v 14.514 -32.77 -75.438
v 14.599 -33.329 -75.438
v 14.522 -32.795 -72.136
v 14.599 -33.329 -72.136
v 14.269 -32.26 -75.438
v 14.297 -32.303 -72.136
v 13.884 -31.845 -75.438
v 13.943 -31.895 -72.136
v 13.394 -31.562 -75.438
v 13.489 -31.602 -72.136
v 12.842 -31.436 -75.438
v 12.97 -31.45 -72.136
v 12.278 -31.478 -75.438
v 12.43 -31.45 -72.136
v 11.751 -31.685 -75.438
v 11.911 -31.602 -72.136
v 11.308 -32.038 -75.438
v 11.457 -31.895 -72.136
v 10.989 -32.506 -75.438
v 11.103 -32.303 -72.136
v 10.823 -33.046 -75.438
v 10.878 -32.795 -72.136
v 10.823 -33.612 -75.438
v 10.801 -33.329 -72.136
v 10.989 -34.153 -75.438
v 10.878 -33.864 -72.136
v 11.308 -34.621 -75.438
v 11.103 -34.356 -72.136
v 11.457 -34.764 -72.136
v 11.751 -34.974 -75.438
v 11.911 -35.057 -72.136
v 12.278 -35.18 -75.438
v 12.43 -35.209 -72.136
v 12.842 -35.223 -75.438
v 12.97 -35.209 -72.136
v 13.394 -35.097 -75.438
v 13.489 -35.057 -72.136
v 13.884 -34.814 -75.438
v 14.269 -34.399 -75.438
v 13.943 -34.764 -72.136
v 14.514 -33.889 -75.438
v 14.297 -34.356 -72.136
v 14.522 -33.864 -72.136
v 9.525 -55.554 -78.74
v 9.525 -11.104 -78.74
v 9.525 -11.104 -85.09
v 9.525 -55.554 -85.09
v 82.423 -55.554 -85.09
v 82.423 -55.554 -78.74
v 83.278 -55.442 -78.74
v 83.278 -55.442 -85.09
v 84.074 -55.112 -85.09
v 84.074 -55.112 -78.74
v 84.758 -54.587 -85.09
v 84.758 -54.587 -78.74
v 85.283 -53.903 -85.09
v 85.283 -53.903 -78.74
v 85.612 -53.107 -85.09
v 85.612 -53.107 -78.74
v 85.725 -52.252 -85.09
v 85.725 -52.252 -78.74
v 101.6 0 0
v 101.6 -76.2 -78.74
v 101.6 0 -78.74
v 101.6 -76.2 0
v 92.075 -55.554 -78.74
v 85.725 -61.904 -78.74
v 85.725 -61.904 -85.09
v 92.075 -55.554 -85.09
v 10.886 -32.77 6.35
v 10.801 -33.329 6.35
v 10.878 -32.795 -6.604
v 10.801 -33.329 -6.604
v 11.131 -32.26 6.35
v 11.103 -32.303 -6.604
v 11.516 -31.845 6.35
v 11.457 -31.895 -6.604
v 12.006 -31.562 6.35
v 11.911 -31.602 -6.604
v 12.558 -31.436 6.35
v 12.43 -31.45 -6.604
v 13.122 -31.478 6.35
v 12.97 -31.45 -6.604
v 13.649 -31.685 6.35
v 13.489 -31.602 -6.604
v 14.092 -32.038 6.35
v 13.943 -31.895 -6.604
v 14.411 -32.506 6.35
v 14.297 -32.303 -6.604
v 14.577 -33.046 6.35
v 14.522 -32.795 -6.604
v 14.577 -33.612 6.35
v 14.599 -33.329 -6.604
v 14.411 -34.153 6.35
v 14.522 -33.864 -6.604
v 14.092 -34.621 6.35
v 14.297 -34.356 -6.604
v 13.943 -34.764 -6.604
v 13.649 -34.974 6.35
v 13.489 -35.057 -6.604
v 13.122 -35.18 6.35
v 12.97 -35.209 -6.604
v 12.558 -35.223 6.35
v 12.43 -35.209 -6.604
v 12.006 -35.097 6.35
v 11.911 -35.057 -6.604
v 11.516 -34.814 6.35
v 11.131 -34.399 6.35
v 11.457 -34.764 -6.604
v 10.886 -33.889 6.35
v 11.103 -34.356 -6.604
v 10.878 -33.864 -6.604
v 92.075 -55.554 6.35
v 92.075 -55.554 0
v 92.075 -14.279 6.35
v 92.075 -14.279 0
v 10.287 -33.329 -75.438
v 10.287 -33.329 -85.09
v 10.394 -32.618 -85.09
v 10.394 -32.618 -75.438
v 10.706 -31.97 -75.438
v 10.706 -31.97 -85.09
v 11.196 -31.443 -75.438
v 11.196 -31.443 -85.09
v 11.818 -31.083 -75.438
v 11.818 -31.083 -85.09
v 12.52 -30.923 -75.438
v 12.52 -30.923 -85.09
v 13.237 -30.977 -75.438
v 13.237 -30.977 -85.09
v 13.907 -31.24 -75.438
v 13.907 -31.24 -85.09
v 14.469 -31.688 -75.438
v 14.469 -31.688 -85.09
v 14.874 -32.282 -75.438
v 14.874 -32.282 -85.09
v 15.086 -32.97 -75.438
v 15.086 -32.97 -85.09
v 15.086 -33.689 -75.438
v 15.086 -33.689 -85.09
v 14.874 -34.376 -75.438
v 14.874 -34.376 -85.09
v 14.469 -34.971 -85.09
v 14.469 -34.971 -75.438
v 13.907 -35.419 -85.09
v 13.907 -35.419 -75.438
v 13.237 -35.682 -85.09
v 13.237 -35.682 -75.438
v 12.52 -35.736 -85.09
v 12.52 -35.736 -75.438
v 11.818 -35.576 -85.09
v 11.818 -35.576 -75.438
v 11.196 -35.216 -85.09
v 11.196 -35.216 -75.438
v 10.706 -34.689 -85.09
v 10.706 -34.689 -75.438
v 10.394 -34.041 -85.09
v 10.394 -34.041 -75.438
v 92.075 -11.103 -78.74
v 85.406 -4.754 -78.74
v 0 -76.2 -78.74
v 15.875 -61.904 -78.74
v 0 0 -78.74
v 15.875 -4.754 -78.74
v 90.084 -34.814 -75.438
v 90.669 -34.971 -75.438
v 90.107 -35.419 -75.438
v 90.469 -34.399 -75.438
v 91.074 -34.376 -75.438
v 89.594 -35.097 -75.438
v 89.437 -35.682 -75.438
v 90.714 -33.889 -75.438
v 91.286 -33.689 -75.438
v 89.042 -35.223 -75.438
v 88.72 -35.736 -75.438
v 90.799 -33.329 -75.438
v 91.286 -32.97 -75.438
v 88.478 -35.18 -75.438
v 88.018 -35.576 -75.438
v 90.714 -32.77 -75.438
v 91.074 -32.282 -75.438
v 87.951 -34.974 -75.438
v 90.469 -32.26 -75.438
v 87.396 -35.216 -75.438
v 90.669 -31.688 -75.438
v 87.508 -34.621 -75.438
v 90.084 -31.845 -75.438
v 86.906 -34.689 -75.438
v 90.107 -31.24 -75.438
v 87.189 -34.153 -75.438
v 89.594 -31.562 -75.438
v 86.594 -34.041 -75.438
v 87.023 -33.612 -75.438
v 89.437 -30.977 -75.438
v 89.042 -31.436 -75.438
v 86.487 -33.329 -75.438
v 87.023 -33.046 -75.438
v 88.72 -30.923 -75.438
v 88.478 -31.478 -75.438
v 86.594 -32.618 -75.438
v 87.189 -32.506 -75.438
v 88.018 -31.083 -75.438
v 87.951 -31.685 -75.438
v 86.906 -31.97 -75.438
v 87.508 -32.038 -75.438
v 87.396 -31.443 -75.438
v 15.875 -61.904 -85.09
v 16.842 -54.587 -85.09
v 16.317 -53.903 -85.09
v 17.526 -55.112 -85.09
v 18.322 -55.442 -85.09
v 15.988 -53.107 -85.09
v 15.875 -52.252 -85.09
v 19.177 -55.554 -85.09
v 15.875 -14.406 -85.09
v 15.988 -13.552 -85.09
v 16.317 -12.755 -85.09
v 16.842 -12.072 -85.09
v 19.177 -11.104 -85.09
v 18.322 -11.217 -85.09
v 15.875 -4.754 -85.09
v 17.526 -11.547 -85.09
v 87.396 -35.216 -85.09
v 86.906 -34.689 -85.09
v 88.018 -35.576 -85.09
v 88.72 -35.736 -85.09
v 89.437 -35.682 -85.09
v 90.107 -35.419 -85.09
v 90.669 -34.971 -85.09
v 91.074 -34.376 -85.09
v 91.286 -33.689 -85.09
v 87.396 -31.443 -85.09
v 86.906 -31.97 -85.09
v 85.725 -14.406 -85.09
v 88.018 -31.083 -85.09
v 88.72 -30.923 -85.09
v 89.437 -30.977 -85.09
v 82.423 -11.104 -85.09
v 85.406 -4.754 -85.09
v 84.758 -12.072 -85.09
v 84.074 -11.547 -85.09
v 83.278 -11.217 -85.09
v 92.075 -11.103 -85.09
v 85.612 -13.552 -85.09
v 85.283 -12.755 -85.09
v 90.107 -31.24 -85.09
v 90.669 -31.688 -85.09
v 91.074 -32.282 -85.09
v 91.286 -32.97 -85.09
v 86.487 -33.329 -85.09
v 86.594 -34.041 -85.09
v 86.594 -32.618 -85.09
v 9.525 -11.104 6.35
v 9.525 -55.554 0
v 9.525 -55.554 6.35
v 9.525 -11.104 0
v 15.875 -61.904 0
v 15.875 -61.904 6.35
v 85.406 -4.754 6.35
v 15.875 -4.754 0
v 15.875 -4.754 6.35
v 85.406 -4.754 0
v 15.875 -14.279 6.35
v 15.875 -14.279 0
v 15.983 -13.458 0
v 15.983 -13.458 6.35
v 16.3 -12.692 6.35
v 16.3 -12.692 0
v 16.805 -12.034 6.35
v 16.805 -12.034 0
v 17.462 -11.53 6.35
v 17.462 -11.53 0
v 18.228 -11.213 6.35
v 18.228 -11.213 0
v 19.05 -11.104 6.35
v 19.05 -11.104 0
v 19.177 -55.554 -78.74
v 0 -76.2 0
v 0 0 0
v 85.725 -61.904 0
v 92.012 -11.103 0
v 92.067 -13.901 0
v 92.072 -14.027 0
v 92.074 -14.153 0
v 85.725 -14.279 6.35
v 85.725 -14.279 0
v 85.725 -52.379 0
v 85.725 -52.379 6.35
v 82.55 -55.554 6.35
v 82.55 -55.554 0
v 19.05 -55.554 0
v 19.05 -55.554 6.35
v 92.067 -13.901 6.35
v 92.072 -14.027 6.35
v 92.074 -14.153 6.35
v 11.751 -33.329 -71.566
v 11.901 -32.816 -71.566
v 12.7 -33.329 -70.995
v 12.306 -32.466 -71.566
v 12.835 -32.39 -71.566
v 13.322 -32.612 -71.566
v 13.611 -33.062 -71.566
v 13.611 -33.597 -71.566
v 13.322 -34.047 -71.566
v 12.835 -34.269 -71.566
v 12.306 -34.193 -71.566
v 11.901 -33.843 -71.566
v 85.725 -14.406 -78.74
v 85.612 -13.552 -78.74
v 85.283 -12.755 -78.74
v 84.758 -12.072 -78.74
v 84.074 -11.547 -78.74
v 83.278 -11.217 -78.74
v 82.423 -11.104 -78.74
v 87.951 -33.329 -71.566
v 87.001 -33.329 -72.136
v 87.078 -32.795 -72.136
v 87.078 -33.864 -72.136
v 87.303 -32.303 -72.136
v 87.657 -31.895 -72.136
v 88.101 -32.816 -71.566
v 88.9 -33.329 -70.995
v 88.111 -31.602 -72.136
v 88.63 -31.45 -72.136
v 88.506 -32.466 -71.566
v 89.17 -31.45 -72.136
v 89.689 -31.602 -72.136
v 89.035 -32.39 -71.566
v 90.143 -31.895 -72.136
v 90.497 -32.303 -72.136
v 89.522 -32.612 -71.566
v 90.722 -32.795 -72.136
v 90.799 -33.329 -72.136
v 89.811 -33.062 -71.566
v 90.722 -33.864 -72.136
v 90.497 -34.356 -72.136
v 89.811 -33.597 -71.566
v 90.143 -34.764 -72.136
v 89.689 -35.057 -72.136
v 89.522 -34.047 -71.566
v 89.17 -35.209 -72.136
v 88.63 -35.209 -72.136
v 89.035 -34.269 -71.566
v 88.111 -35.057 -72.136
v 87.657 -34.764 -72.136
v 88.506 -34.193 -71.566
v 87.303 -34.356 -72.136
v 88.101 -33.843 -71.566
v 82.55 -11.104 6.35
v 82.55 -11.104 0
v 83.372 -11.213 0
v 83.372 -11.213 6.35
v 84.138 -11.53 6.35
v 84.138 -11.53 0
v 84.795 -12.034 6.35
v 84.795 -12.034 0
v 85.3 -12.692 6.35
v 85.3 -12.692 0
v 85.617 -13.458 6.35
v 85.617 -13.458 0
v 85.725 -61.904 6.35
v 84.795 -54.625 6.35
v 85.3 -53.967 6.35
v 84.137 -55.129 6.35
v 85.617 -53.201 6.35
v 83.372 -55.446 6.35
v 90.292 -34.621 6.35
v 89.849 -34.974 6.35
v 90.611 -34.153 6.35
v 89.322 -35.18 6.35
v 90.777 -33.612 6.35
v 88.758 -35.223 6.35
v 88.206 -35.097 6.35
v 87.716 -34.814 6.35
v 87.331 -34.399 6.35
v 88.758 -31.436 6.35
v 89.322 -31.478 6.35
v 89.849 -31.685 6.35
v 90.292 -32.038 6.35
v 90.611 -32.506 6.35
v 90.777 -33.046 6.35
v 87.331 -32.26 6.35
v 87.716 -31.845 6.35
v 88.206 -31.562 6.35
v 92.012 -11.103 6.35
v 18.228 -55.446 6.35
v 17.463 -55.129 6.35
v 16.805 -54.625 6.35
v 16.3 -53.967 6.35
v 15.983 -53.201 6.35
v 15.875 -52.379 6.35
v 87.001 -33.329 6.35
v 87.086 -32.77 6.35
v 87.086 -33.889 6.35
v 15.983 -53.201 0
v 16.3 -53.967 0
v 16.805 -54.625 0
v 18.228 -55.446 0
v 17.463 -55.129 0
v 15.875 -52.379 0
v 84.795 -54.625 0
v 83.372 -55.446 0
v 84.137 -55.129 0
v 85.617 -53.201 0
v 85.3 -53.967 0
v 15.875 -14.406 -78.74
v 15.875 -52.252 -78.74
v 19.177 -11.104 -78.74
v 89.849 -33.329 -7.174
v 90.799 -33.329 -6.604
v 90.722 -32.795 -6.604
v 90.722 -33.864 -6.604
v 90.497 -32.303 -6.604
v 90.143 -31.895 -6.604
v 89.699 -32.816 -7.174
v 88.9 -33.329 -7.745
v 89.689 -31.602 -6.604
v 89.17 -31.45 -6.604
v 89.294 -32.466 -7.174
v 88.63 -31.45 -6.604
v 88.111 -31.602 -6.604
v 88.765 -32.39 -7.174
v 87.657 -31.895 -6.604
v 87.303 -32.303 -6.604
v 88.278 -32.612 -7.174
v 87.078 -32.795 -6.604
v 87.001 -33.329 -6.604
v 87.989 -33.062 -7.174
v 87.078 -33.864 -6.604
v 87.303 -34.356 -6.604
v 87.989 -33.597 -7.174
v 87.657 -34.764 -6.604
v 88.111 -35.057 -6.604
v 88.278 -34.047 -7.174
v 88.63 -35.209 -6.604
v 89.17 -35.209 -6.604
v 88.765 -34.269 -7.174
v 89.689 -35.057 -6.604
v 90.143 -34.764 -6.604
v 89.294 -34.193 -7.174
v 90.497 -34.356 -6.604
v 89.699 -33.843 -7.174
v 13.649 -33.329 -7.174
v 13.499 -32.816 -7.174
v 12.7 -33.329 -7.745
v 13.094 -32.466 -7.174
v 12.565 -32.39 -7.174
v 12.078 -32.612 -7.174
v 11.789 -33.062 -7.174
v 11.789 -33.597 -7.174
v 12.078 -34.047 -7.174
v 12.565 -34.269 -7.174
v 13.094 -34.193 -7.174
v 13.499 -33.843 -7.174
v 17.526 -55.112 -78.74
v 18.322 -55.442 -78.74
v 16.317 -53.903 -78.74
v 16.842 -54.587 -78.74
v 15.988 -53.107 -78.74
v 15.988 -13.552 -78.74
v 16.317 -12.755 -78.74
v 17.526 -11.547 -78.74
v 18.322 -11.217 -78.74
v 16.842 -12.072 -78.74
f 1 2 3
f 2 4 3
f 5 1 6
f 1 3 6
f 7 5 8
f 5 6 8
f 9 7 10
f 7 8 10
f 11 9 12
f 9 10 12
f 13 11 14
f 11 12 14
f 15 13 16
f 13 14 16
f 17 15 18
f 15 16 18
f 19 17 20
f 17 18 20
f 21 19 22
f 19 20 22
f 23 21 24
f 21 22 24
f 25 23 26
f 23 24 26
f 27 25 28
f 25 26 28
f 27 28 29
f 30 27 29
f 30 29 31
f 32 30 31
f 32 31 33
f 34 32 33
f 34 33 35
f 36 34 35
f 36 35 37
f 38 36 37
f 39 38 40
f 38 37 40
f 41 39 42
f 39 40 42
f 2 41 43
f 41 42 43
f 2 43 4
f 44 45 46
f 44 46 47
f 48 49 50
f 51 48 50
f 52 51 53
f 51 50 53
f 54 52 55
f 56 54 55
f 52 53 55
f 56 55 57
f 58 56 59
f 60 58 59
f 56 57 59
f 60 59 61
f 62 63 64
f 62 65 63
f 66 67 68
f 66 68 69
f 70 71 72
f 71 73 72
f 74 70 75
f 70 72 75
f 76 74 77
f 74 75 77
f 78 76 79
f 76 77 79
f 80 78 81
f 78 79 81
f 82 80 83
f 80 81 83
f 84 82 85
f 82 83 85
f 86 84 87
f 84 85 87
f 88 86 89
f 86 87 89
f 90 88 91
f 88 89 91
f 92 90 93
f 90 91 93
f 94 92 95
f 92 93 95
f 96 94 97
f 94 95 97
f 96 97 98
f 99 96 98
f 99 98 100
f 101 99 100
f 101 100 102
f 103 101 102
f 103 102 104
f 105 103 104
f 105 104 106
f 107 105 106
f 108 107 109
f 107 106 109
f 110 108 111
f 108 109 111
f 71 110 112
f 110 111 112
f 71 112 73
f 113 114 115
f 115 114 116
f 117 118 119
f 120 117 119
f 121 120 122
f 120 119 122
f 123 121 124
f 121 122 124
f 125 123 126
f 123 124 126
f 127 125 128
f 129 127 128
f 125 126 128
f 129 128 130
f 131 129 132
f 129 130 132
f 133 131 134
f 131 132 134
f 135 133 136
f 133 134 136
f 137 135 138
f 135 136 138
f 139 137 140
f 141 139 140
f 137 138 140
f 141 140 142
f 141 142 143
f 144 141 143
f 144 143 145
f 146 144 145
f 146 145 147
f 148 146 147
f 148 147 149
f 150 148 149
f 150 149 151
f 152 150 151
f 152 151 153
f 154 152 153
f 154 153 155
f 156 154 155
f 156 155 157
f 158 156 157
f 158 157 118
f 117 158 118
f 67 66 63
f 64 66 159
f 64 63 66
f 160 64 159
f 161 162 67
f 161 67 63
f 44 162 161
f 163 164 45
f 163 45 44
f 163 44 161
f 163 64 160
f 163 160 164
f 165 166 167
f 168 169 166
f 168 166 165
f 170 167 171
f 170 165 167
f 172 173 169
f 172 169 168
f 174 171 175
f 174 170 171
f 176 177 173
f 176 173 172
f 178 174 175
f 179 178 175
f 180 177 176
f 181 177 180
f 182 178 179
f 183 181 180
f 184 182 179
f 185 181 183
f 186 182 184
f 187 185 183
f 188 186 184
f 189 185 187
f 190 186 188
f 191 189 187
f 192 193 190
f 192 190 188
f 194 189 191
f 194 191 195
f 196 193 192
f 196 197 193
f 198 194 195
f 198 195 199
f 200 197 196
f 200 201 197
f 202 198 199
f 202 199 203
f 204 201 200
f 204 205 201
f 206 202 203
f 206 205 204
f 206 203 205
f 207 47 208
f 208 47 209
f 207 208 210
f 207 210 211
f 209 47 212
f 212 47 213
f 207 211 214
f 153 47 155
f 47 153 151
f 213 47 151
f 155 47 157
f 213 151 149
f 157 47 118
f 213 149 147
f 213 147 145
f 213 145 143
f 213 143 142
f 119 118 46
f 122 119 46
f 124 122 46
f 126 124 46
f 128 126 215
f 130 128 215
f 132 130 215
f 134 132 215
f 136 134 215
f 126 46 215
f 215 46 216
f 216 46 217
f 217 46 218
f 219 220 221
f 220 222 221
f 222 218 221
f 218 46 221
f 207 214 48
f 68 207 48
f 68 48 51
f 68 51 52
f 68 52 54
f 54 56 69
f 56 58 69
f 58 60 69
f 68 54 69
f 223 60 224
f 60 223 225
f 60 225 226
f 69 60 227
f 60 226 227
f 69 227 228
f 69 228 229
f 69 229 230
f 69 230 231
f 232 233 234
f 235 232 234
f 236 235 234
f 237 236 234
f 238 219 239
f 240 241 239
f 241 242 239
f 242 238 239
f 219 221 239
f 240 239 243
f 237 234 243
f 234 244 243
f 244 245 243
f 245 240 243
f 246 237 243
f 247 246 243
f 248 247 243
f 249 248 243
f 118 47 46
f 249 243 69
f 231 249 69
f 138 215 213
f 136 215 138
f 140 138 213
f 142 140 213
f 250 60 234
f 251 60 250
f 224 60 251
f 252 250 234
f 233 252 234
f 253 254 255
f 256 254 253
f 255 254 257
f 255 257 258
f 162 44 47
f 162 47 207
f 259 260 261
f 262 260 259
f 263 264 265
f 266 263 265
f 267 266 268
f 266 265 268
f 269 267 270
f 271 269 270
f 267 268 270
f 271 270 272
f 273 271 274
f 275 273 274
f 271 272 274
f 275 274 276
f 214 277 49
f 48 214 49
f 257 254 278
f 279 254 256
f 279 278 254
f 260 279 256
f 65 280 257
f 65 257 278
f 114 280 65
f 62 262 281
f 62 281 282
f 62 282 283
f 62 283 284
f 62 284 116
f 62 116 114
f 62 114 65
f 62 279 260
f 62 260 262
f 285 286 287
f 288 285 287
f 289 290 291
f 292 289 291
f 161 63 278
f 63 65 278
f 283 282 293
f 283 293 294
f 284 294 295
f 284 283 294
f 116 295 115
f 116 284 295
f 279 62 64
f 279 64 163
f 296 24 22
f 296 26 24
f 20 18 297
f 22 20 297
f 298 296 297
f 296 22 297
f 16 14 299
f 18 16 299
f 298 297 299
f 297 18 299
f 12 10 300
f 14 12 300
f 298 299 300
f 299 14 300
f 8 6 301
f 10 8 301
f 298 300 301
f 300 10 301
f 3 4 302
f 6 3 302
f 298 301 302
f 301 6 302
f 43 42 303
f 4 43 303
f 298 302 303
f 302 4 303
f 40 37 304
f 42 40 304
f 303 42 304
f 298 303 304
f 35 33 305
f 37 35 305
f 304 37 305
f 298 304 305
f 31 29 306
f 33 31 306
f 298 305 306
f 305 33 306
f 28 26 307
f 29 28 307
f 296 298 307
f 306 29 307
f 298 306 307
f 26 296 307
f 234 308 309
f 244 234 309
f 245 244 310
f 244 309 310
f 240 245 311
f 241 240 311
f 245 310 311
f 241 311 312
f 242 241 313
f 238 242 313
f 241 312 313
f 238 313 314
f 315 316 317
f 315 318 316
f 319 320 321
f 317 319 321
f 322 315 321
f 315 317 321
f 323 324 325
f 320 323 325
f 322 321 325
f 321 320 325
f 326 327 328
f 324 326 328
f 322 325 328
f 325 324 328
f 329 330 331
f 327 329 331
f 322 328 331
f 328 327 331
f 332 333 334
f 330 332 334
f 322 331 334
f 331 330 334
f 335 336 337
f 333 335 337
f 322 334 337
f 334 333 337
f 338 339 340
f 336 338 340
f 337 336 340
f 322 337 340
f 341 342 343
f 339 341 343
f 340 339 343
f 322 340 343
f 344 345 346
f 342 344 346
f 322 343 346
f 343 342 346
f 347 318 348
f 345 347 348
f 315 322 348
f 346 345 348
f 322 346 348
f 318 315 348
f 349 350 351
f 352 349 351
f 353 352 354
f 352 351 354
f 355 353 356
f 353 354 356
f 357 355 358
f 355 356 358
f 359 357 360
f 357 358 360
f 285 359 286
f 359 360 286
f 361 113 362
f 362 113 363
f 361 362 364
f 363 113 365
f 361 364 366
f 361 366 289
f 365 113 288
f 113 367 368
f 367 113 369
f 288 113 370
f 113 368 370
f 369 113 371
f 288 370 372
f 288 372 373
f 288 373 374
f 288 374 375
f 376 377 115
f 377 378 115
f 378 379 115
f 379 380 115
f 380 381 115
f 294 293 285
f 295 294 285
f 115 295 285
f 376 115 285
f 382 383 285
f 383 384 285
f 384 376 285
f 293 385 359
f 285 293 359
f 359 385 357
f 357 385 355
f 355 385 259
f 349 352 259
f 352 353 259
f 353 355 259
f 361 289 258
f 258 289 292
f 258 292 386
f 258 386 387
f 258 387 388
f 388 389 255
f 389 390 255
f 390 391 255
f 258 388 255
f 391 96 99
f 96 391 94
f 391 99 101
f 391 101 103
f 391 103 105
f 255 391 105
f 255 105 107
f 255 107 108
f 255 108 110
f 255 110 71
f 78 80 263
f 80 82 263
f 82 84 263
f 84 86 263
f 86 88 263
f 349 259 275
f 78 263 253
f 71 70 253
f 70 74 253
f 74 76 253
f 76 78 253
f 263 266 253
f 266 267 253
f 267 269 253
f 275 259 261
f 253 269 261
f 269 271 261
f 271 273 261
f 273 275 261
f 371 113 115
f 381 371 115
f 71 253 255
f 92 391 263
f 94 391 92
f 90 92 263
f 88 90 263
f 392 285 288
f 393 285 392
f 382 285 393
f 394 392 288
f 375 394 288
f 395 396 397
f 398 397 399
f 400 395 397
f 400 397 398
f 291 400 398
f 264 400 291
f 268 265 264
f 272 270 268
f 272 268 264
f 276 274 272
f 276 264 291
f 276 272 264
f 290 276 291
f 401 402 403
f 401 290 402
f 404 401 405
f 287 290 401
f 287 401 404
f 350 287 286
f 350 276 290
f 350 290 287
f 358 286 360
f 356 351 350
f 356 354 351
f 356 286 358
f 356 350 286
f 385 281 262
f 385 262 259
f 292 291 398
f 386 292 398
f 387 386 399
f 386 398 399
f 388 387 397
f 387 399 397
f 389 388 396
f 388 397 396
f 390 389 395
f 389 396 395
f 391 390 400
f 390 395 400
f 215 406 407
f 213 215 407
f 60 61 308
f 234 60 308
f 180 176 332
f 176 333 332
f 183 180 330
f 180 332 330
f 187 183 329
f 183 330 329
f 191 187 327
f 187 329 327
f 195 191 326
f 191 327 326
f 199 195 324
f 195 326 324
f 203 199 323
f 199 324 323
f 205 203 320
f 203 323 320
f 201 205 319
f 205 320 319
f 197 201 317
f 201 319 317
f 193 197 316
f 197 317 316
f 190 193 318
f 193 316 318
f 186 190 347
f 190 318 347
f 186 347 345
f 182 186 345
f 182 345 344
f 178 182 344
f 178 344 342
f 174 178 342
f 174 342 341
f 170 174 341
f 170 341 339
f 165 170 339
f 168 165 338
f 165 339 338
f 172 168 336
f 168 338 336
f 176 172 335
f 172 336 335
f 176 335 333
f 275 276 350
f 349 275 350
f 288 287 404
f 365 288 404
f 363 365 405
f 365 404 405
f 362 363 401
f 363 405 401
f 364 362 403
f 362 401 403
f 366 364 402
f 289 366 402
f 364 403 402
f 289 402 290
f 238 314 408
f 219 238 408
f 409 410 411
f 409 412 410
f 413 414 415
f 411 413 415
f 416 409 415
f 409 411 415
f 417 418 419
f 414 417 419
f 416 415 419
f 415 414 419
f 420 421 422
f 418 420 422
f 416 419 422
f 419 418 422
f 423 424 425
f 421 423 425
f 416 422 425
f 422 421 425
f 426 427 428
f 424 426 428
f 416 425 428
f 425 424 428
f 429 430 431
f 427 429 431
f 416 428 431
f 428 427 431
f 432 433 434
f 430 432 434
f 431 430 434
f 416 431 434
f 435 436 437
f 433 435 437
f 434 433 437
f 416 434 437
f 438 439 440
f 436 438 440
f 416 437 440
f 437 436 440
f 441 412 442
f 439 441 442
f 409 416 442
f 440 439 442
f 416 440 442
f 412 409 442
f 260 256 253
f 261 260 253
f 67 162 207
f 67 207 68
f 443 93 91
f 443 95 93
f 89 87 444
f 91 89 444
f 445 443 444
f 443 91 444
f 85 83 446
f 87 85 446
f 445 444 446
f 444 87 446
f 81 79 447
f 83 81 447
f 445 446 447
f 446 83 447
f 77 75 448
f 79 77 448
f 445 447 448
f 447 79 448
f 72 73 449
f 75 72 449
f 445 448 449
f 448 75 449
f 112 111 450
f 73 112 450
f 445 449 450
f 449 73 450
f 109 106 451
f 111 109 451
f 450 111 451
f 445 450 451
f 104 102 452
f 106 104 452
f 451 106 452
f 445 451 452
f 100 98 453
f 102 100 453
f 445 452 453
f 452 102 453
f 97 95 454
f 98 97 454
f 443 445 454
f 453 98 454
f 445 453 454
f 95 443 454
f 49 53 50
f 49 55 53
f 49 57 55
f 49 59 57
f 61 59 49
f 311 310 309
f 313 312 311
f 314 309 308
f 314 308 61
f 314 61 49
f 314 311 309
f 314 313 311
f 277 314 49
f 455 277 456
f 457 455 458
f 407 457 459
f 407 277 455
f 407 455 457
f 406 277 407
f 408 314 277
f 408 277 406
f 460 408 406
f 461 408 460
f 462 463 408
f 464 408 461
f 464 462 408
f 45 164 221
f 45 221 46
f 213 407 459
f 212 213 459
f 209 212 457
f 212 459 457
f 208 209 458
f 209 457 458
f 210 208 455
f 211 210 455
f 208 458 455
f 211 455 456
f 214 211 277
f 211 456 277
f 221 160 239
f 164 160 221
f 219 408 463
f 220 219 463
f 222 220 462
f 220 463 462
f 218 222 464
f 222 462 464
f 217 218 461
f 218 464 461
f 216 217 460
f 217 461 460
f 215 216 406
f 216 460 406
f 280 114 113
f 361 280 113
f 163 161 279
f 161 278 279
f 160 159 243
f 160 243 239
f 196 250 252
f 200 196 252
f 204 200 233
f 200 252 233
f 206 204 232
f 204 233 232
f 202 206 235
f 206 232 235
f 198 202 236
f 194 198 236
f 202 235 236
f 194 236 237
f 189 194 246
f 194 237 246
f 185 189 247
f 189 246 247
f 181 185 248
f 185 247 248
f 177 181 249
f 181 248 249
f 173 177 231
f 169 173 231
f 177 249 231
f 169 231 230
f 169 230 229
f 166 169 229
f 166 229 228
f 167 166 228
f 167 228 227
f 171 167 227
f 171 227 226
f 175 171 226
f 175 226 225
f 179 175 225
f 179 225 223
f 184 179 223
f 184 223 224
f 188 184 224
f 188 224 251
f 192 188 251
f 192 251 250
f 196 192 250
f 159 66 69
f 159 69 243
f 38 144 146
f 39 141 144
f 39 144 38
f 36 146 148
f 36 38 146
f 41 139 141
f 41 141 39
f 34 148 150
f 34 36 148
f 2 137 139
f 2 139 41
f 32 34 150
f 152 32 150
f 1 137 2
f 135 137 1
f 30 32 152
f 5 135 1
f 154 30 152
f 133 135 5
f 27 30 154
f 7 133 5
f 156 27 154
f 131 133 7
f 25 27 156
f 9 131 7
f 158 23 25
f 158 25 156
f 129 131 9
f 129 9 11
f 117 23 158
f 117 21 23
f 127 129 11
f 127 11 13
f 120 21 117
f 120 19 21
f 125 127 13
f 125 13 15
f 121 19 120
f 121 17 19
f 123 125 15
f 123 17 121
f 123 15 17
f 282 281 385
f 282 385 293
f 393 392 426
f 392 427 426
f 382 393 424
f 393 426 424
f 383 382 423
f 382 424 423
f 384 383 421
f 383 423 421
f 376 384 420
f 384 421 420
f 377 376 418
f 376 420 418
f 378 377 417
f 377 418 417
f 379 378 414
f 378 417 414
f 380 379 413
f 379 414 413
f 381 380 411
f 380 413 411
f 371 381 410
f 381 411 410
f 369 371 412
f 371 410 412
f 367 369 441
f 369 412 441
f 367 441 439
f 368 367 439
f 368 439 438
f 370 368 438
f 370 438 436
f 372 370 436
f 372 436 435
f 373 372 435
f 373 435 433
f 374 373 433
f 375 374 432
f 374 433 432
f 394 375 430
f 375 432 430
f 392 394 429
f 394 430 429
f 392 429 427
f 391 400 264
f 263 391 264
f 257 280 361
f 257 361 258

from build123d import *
from OCP.BRepFilletAPI import BRepFilletAPI_MakeChamfer

# Parameters (mm, degrees)
SKETCH1_W                        = 101.6
SKETCH1_H                        = 76.2
EXTRUDE1_DEPTH                   = 76.2
EXTRUDE2_DEPTH                   = 6.35
F_10_24_TAPPED_HOLE1_D           = 3.7973
F_10_24_TAPPED_HOLE1_DEPTH       = 12.954
F_10_24_TAPPED_HOLE1_TIP         = 1.140824014
EXTRUDE3_DEPTH                   = 6.35
CHAMFER1_SIZE                    = 6.35
CHAMFER1_SIZE2                   = 6.479869459
EXTRUDE4_DEPTH                   = 6.35
SKETCH8_W                        = 101.6
SKETCH8_H                        = 76.2
EXTRUDE5_DEPTH                   = 2.54
F_10_24_TAPPED_HOLE2_D           = 3.7973
F_10_24_TAPPED_HOLE2_DEPTH       = 12.954
F_10_24_TAPPED_HOLE2_CBORE_D     = 4.826
F_10_24_TAPPED_HOLE2_CBORE_DEPTH = 9.652
F_10_24_TAPPED_HOLE2_TIP         = 1.140824014


with BuildPart() as part:
    # Sketch1 → Extrude1 (new body)
    with BuildSketch(Plane(origin=(0, 0, 0), x_dir=(1, 0, 0), z_dir=(0, 1, 0))):
        with Locations((50.8, 38.1)):
            Rectangle(SKETCH1_W, SKETCH1_H)
    extrude(amount=-EXTRUDE1_DEPTH)

    # Sketch3 → Extrude2 (add)
    with BuildSketch(Plane.XY):
        with BuildLine():
            Line((19.05, -4.754440133), (82.55, -4.754440133))
            ThreePointArc((82.55, -4.754440133), (89.285192091, -7.544248042), (92.075, -14.279440133))
            Line((92.075, -14.279440133), (92.075, -52.379440133))
            ThreePointArc((92.075, -52.379440133), (89.285192091, -59.114632223), (82.55, -61.904440133))
            Line((82.55, -61.904440133), (19.05, -61.904440133))
            ThreePointArc((19.05, -61.904440133), (12.314807909, -59.114632223), (9.525, -52.379440133))
            Line((9.525, -52.379440133), (9.525, -14.279440133))
            ThreePointArc((9.525, -14.279440133), (12.314807909, -7.544248042), (19.05, -4.754440133))
        make_face()
        with BuildLine():
            Line((19.05, -11.104440133), (82.55, -11.104440133))
            ThreePointArc((82.55, -11.104440133), (84.79506403, -12.034376102), (85.725, -14.279440133))
            Line((85.725, -14.279440133), (85.725, -52.379440133))
            ThreePointArc((85.725, -52.379440133), (84.79506403, -54.624504163), (82.55, -55.554440133))
            Line((82.55, -55.554440133), (19.05, -55.554440133))
            ThreePointArc((19.05, -55.554440133), (16.80493597, -54.624504163), (15.875, -52.379440133))
            Line((15.875, -52.379440133), (15.875, -14.279440133))
            ThreePointArc((15.875, -14.279440133), (16.80493597, -12.034376102), (19.05, -11.104440133))
        make_face(mode=Mode.SUBTRACT)
    extrude(amount=EXTRUDE2_DEPTH)

    # #10-24 Tapped Hole1
    with Locations(Plane(origin=(12.7, -33.329440133, 6.35), x_dir=(1, 0, 0), z_dir=(0, 0, 1))):
        with Locations((0, 0), (76.2, 0)):
            Hole(F_10_24_TAPPED_HOLE1_D / 2, depth=F_10_24_TAPPED_HOLE1_DEPTH)
            with Locations((0, 0, -(F_10_24_TAPPED_HOLE1_DEPTH + F_10_24_TAPPED_HOLE1_TIP / 2))):  # 118° drill point
                Cone(0, F_10_24_TAPPED_HOLE1_D / 2, F_10_24_TAPPED_HOLE1_TIP, mode=Mode.SUBTRACT)

    # Sketch6 → Extrude3 (add)
    with BuildSketch(Plane.XY):
        Polygon((82.55, -4.754440133), (91.885938624, -4.754440133), (92.075, -14.279440133), align=None)
        Polygon((92.075, -52.379440133), (82.55, -61.904440133), (92.075, -61.904440133), align=None)
        Polygon((9.525, -14.279440133), (19.05, -4.754440133), (9.525, -4.754440133), align=None)
        Polygon((9.525, -52.379440133), (19.05, -61.904440133), (9.525, -61.904440133), align=None)
    extrude(amount=EXTRUDE3_DEPTH)

    # Chamfer1: one chamfer whose edges measure the first distance from different faces: ONE call of the kernel's chamfer builder (chamfer() names one face for all edges)
    chamfer1_edges_1 = [part.edges().sort_by_distance(p)[0] for p in [
        (92.075, -61.904440133, 3.175),
        (9.525, -61.904440133, 3.175),
        (9.525, -4.754440133, 3.175),
    ]]
    chamfer1_edges_2 = [part.edges().sort_by_distance(p)[0] for p in [
        (91.885938624, -4.754440133, 3.175),
    ]]
    chamfer1_side_2 = [part.faces().sort_by_distance(p)[0] for p in [
        (91.976718118, -9.327953214, 3.175),
    ]]
    chamfer1 = BRepFilletAPI_MakeChamfer(part.part.solid().wrapped)
    for e in chamfer1_edges_1:
        chamfer1.Add(CHAMFER1_SIZE, e.wrapped)
    for e in chamfer1_edges_2:
        chamfer1.Add(CHAMFER1_SIZE, CHAMFER1_SIZE2, e.wrapped, chamfer1_side_2[0].wrapped)  # the first distance lies on this face
    add(Compound.cast(chamfer1.Shape()), mode=Mode.REPLACE)



with BuildPart() as body_2:
    # Sketch7 → Extrude4 (new body)
    with BuildSketch(Plane(origin=(0, 0, -78.74), x_dir=(-1, 0, 0), z_dir=(0, 0, -1))):
        Polygon((-85.406069165, -4.754440133), (-15.875, -4.754440133), (-9.525, -11.104440133), (-9.525, -55.554440133), (-15.875, -61.904440133), (-85.725, -61.904440133), (-92.075, -55.554440133), (-92.075, -11.103141464), align=None)
        with BuildLine():
            Line((-15.875, -14.406440133), (-15.875, -52.252440133))
            ThreePointArc((-15.875, -52.252440133), (-16.842133409, -54.587306724), (-19.177, -55.554440133))
            Line((-19.177, -55.554440133), (-82.423, -55.554440133))
            ThreePointArc((-82.423, -55.554440133), (-84.757866591, -54.587306724), (-85.725, -52.252440133))
            Line((-85.725, -52.252440133), (-85.725, -14.406440133))
            ThreePointArc((-85.725, -14.406440133), (-84.757866591, -12.071573541), (-82.423, -11.104440133))
            Line((-82.423, -11.104440133), (-19.177, -11.104440133))
            ThreePointArc((-19.177, -11.104440133), (-16.842133409, -12.071573541), (-15.875, -14.406440133))
        make_face(mode=Mode.SUBTRACT)
    extrude(amount=EXTRUDE4_DEPTH)


with BuildPart() as part_1:
    add(part.part)

    add(body_2.part)  # Extrude5 merges body 2
    # Sketch8 → Extrude5 (add)
    with BuildSketch(Plane(origin=(0, 0, -76.2), x_dir=(-1, 0, 0), z_dir=(0, 0, -1))):
        with Locations((-50.8, -38.1)):
            Rectangle(SKETCH8_W, SKETCH8_H)
    extrude(amount=EXTRUDE5_DEPTH)

    # #10-24 Tapped Hole2
    with Locations(Plane(origin=(88.9, -33.329440133, -85.09), x_dir=(-1, 0, 0), z_dir=(0, 0, -1))):
        with Locations((0, 0), (76.2, 0)):
            CounterBoreHole(F_10_24_TAPPED_HOLE2_D / 2, F_10_24_TAPPED_HOLE2_CBORE_D / 2, F_10_24_TAPPED_HOLE2_CBORE_DEPTH, depth=F_10_24_TAPPED_HOLE2_DEPTH)
            with Locations((0, 0, -(F_10_24_TAPPED_HOLE2_DEPTH + F_10_24_TAPPED_HOLE2_TIP / 2))):  # 118° drill point
                Cone(0, F_10_24_TAPPED_HOLE2_D / 2, F_10_24_TAPPED_HOLE2_TIP, mode=Mode.SUBTRACT)


solid = part_1.part
